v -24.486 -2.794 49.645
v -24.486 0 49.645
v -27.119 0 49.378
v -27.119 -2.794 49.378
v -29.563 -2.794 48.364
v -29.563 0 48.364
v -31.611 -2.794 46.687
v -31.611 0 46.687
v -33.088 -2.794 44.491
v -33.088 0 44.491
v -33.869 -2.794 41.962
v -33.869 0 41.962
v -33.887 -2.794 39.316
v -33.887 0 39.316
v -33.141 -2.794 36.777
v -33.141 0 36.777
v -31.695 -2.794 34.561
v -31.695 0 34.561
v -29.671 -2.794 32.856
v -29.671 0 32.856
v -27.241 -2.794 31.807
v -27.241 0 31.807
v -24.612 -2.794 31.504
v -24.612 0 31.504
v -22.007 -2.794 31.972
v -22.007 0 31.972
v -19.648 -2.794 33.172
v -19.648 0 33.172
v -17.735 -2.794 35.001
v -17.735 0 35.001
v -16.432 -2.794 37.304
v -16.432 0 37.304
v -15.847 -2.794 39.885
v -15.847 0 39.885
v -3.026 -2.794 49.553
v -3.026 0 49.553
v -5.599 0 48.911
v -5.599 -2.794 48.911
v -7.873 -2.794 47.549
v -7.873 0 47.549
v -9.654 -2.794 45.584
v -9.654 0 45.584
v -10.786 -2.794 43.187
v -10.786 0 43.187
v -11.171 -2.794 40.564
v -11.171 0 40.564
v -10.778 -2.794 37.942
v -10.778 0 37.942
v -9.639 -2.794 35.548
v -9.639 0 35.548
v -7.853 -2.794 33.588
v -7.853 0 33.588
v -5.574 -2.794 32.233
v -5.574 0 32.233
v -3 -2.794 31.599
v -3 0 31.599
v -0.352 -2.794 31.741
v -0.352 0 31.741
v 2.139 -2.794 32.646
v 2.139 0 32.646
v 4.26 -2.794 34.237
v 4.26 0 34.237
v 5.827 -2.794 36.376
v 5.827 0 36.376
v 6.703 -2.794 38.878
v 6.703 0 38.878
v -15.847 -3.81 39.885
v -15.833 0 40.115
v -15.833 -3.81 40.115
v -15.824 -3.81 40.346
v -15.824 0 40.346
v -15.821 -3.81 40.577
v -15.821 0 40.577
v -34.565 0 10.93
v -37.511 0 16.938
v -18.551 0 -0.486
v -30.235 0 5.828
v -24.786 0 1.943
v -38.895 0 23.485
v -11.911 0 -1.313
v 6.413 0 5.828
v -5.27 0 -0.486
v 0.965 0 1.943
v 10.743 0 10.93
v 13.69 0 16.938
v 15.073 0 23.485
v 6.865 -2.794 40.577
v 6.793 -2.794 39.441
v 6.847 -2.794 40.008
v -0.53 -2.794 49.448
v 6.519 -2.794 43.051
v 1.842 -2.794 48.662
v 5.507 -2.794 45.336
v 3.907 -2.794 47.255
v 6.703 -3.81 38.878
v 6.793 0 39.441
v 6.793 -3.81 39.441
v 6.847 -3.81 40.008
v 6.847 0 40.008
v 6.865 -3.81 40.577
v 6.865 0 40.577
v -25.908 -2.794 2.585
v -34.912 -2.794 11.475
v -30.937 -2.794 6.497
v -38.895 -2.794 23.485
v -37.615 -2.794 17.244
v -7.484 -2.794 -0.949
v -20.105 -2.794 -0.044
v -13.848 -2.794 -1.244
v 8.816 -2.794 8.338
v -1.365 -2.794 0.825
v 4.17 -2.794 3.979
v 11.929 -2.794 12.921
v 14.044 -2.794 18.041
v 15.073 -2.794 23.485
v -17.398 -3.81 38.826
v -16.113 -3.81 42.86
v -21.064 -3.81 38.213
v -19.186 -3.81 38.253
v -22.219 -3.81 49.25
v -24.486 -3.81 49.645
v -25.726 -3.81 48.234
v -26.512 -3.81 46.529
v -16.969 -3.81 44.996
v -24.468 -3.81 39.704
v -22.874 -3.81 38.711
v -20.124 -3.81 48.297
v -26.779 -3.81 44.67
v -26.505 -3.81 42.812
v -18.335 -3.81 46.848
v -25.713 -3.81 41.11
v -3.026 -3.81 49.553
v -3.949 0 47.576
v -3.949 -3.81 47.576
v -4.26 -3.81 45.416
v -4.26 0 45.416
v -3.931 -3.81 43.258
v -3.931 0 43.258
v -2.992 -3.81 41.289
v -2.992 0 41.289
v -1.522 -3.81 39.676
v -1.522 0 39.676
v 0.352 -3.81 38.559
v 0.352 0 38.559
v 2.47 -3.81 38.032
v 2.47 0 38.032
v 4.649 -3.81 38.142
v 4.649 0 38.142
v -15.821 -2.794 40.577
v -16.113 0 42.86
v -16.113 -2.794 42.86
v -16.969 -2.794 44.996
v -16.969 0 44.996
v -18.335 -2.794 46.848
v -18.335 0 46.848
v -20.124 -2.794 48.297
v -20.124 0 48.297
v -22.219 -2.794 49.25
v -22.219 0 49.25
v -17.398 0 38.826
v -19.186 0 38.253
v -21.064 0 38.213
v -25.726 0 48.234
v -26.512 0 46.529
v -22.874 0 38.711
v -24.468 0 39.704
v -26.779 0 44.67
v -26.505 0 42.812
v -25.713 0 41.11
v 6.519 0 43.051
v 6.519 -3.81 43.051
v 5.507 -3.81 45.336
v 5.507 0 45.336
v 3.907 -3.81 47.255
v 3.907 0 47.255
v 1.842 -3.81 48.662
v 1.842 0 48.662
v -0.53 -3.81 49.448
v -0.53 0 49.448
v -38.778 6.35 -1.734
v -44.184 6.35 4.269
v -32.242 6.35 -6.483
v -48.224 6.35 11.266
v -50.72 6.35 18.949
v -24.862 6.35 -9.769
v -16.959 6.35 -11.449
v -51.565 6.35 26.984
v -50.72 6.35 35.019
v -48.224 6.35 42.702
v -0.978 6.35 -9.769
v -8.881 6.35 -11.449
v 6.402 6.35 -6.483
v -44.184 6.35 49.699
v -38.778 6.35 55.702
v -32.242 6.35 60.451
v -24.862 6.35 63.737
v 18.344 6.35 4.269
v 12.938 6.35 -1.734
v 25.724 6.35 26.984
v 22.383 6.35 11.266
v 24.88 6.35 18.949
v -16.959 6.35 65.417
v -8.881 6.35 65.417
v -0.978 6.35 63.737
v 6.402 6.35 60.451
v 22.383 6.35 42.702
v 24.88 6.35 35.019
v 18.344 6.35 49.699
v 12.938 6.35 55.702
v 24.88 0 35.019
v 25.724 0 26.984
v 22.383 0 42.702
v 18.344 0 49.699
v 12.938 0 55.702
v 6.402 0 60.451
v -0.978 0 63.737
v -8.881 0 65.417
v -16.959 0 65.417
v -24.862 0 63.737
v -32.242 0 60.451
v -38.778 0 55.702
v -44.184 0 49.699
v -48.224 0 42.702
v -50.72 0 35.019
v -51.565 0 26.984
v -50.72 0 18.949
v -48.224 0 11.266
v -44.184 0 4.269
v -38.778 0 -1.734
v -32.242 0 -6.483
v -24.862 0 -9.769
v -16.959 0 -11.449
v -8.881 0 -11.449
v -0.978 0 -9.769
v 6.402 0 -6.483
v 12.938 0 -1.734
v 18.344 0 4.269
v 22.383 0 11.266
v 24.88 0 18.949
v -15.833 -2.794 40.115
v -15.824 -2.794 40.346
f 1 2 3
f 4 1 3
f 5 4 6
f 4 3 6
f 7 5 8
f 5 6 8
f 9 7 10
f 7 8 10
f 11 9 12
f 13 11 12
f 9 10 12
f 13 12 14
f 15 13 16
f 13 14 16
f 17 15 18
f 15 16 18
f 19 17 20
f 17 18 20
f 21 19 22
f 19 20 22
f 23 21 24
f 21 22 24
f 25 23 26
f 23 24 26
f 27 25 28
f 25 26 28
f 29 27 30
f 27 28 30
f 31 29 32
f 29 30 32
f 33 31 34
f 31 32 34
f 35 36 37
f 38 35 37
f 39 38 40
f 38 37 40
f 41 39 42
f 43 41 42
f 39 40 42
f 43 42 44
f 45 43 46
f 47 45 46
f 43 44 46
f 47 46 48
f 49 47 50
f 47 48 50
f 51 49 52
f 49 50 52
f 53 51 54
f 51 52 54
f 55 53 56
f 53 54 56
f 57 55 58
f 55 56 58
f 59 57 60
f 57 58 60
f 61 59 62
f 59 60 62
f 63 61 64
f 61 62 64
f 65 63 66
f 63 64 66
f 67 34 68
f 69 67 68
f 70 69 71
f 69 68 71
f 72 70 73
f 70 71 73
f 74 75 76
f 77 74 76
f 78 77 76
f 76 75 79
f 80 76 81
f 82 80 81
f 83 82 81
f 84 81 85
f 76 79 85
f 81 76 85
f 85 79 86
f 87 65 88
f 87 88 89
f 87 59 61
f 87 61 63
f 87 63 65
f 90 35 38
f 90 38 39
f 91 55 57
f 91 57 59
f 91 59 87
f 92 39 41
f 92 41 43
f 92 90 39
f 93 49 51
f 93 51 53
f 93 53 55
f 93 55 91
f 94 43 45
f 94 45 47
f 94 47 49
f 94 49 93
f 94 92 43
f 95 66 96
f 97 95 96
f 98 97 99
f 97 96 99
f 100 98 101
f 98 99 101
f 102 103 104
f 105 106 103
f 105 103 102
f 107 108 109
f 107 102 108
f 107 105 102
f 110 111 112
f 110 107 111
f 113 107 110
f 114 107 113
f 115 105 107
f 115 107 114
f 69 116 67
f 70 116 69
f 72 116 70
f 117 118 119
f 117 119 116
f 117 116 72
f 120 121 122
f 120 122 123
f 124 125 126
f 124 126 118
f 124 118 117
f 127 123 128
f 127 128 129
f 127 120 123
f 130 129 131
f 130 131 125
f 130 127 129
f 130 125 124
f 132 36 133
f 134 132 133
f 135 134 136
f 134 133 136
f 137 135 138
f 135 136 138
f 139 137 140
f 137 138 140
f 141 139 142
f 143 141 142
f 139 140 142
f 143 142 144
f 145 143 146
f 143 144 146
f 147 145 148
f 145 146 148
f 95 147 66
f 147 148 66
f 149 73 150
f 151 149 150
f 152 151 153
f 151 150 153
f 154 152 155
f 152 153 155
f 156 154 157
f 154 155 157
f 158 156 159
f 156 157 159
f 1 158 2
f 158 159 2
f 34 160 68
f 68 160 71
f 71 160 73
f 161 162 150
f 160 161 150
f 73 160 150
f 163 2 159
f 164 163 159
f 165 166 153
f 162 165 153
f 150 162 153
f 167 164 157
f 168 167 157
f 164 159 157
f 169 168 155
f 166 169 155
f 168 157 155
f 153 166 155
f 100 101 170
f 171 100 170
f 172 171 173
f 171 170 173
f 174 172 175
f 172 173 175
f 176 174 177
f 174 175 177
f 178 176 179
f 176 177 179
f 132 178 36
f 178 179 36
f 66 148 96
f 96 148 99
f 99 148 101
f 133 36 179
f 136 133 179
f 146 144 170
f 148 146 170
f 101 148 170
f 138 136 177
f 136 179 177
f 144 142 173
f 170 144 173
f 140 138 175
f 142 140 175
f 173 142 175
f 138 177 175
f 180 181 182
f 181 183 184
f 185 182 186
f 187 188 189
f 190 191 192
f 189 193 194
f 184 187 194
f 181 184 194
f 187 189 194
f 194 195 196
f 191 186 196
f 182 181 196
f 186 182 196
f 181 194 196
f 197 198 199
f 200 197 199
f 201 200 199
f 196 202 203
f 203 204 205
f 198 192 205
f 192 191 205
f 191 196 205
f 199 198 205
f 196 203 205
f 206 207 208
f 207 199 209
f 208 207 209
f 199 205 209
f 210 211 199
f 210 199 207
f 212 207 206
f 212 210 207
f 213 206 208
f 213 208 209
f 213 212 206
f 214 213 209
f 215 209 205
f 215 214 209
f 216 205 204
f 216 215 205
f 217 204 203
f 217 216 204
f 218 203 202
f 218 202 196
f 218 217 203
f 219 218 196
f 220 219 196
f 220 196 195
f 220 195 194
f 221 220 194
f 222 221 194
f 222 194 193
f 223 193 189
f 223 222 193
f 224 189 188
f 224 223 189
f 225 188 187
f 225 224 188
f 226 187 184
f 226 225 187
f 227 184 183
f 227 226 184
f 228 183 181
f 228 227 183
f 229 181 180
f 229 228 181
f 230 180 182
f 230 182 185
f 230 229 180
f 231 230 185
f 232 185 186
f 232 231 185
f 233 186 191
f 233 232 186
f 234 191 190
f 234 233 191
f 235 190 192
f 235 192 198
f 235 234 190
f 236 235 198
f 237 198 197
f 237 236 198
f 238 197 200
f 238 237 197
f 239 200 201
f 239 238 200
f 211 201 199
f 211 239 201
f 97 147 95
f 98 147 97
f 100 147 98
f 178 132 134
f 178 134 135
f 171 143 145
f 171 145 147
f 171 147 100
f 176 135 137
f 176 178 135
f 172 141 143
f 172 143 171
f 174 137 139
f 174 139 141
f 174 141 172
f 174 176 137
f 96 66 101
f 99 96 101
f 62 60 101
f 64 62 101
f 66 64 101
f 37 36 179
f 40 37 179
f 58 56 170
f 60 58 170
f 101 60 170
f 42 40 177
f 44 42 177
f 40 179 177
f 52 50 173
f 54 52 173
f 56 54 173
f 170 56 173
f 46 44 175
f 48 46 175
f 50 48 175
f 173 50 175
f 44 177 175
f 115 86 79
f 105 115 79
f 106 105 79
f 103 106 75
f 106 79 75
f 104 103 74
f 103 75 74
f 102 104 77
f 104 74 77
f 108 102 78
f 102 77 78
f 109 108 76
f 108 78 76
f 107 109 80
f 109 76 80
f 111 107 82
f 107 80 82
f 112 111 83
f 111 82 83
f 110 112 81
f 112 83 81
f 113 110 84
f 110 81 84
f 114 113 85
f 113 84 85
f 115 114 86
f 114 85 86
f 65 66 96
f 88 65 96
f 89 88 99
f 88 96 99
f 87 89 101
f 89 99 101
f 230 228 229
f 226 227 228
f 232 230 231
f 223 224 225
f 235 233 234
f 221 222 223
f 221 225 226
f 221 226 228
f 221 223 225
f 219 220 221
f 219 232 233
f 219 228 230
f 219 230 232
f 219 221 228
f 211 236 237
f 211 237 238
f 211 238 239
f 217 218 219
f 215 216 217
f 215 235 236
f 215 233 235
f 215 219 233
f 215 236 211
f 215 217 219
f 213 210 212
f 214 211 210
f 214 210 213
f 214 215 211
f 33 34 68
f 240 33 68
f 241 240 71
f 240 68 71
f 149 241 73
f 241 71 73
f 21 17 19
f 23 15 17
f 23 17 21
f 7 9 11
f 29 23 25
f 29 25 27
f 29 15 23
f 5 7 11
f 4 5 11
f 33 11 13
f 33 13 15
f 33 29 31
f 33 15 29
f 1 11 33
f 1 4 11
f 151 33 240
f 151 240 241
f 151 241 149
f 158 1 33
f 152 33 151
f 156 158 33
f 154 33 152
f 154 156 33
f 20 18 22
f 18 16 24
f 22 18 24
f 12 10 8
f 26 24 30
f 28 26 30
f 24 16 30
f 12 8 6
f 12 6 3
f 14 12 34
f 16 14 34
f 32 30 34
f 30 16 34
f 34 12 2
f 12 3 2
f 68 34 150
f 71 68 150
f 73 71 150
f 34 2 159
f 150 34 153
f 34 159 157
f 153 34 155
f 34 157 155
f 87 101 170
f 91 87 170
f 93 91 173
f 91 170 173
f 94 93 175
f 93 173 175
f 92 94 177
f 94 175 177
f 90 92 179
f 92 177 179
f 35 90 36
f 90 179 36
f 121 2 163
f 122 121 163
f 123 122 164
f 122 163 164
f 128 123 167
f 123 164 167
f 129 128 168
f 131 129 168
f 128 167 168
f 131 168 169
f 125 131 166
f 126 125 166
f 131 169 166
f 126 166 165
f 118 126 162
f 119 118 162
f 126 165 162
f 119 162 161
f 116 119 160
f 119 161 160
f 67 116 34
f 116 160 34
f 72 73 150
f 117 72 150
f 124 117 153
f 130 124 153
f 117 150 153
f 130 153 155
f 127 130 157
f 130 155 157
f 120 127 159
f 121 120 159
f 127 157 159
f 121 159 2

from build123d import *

# Parameters (mm, degrees)
F1_DEPTH = 3.81
F2_DEPTH = 2.794
F3_R     = 38.644504
F4_DEPTH = 6.35
F6_DEPTH = 1.27


with BuildPart() as f1:
    # F0 (on Front) → F1 (new body)
    with BuildSketch(Plane.XZ):
        with BuildLine():
            ThreePointArc((-15.847239, 39.88485), (-15.827422, 40.230662), (-15.820813, 40.57698))
            ThreePointArc((-15.820813, 40.57698), (-18.335457, 46.848204), (-24.486127, 49.644799))
            ThreePointArc((-24.486127, 49.644799), (-25.141357, 40.361559), (-15.847239, 39.88485))
        make_face()
        with BuildLine():
            ThreePointArc((6.703352, 38.878352), (6.824326, 39.72384), (6.864771, 40.57698))
            ThreePointArc((6.864771, 40.57698), (3.906987, 47.25521), (-3.026162, 49.552753))
            ThreePointArc((-3.026162, 49.552753), (-2.316264, 40.428477), (6.703352, 38.878352))
        make_face()
    extrude(amount=F1_DEPTH)


with BuildPart() as f2:
    # F0 (on Front) → F2 (new body)
    with BuildSketch(Plane.XZ):
        with BuildLine():
            ThreePointArc((-15.847239, 39.88485), (-15.827422, 40.230662), (-15.820813, 40.57698))
            ThreePointArc((-15.820813, 40.57698), (-18.335457, 46.848204), (-24.486127, 49.644799))
            ThreePointArc((-24.486127, 49.644799), (-25.141357, 40.361559), (-15.847239, 39.88485))
        make_face()
        with BuildLine():
            ThreePointArc((-15.847239, 39.88485), (-25.141357, 40.361559), (-24.486127, 49.644799))
            ThreePointArc((-24.486127, 49.644799), (-31.694991, 34.560698), (-15.847239, 39.88485))
        make_face()
        with BuildLine():
            ThreePointArc((6.703352, 38.878352), (6.824326, 39.72384), (6.864771, 40.57698))
            ThreePointArc((6.864771, 40.57698), (3.906987, 47.25521), (-3.026162, 49.552753))
            ThreePointArc((-3.026162, 49.552753), (-2.316264, 40.428477), (6.703352, 38.878352))
        make_face()
        with BuildLine():
            ThreePointArc((6.703352, 38.878352), (-2.316264, 40.428477), (-3.026162, 49.552753))
            ThreePointArc((-3.026162, 49.552753), (-8.818266, 34.502025), (6.703352, 38.878352))
        make_face()
        with BuildLine():
            Line((15.073373, 23.484852), (-38.894687, 23.484852))
            ThreePointArc((-38.894687, 23.484852), (-11.910657, -1.313124), (15.073373, 23.484852))
        make_face()
    extrude(amount=F2_DEPTH)

    # F5 (on face) → F6 (join)
    with BuildSketch(Plane.XZ.offset(2.794)):
        with BuildLine():
            ThreePointArc((-8.998633, -1.1561), (0.826267, 1.869185), (8.815678, 8.338368))
            ThreePointArc((8.815678, 8.338368), (-2.299838, 7.734643), (-8.998633, -1.1561))
        make_face()
    extrude(amount=-F6_DEPTH)


with BuildPart() as f4:
    # F3 (on Front) → F4 (new body)
    with BuildSketch(Plane.XZ):
        with Locations((-12.920034, 26.984029)):
            Circle(F3_R)
    extrude(amount=-F4_DEPTH)


solid = Compound([f1.part, f2.part, f4.part])
